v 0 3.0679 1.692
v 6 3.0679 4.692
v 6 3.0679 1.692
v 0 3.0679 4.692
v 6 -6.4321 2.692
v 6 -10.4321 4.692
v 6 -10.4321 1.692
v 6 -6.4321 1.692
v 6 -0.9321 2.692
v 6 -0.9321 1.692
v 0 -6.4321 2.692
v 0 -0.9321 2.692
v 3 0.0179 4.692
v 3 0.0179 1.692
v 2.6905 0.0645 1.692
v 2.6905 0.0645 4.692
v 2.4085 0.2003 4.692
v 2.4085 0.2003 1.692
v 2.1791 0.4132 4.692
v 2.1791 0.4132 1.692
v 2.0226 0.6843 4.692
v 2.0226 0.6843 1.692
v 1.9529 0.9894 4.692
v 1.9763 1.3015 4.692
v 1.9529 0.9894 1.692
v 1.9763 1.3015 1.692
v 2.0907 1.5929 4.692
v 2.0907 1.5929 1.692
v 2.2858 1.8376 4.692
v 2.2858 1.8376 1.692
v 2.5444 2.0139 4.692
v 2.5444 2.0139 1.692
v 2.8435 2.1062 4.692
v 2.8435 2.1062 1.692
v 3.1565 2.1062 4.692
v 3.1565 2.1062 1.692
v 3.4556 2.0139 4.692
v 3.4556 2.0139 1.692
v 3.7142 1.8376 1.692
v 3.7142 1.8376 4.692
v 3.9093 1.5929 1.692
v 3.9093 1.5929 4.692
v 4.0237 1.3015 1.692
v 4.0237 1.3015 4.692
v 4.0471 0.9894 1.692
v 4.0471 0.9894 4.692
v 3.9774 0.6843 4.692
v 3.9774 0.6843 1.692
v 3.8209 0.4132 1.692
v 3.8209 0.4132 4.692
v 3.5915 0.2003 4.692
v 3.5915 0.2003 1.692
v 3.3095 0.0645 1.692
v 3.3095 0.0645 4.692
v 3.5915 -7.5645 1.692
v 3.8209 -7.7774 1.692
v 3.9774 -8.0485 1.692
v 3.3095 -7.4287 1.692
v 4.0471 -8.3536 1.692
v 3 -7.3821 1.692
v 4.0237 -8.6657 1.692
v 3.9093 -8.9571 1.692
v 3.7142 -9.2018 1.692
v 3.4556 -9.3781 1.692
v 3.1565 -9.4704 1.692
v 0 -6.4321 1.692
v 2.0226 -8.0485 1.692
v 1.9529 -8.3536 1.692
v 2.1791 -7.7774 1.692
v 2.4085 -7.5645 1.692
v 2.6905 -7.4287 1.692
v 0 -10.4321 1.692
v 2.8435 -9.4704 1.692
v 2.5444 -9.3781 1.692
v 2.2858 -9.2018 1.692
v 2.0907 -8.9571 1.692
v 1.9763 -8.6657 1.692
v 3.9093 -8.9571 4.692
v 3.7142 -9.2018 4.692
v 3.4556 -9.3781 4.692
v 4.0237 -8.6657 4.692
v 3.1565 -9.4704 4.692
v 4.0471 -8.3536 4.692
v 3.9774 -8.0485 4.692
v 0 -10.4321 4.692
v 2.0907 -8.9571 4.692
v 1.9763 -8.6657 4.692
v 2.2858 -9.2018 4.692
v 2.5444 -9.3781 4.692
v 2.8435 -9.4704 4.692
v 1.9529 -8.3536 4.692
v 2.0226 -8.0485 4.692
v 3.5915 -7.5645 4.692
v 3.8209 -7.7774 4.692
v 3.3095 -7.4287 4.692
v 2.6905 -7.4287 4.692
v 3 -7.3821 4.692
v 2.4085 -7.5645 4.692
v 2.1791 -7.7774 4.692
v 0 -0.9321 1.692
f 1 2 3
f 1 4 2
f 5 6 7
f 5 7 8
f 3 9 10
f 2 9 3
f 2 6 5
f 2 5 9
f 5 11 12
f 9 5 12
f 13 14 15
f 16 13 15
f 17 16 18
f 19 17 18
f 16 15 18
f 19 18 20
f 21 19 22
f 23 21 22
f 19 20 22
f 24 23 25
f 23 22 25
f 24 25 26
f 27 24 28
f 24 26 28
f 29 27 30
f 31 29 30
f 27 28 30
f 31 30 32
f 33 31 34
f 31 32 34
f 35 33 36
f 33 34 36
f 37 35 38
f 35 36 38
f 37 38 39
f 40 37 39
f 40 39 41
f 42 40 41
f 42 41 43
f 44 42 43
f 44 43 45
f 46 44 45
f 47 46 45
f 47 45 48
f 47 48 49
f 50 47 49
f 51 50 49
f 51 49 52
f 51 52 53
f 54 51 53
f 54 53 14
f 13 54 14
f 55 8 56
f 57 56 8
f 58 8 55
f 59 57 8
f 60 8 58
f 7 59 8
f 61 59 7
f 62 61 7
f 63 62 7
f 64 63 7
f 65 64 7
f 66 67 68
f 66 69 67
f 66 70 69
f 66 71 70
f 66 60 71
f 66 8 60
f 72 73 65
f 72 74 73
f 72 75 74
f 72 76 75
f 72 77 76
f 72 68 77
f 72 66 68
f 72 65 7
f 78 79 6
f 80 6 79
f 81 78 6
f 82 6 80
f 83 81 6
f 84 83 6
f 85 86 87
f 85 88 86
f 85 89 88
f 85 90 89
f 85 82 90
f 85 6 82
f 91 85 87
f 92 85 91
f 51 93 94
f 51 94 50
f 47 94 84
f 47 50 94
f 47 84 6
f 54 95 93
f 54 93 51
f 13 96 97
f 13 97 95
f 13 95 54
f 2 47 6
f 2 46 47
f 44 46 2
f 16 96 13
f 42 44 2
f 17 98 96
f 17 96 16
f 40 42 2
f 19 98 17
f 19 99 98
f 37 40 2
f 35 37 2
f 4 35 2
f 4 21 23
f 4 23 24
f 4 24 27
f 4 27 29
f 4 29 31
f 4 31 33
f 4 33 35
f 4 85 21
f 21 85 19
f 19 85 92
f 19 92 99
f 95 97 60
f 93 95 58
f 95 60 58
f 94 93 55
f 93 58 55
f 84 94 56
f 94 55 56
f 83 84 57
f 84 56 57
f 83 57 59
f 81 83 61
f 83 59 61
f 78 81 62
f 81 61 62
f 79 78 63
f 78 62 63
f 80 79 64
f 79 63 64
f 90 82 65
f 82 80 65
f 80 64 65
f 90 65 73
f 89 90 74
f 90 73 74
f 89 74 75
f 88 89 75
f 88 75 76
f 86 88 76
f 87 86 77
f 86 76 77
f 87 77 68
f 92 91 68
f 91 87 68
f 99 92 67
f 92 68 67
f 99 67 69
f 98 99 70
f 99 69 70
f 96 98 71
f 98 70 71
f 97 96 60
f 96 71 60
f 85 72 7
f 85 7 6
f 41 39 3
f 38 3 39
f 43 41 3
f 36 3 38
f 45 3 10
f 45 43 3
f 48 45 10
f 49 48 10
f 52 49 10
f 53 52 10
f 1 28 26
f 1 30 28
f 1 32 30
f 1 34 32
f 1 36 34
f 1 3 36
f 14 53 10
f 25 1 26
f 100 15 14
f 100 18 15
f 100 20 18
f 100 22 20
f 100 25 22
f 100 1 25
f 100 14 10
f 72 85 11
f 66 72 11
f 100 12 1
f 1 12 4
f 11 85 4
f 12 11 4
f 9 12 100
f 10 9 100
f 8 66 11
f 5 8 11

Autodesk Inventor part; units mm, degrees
ref_plane "YZ Plane" through (0, 0, 0) normal (1, 0, 0) x (0, 1, 0)
ref_plane "XZ Plane" through (0, 0, 0) normal (0, 1, 0) x (-1, 0, 0)
ref_plane "XY Plane" through (0, 0, 0) normal (0, 0, 1) x (1, 0, 0)
sketch "Sketch1" plane through (0, 0, 0) normal (1, 0, 0) x (0, 1, 0)
  line L0 (-0.5, 0) -> (0.55, 0) projected
  line L1 (3.0679, 1.692) -> (-10.4321, 1.692)
  line L2 (-10.4321, 1.692) -> (-10.4321, 4.692)
  line L3 (-10.4321, 4.692) -> (3.0679, 4.692)
  line L4 (3.0679, 4.692) -> (3.0679, 1.692)
  line L5 (-0.9321, 1.692) -> (-6.4321, 1.692)
  line L6 (-6.4321, 1.692) -> (-6.4321, 2.692)
  line L7 (-6.4321, 2.692) -> (-0.9321, 2.692)
  line L8 (-0.9321, 2.692) -> (-0.9321, 1.692)
  line L9 (-3.6821, 1.692) -> (-3.6821, 4.692) construction
  line L10 (1.0679, 4.692) -> (1.0679, 1.692) construction
  line L11 (-0.5, 0) -> (0.55, 0) construction
  point P0 (0, 0)
  dimension "d0" = 5.5
  dimension "d1" = 4
  dimension "d2" = 2
  dimension "d3" = 1
  dimension "d4" = 2
extrude "Extrusion1" add sketch "Sketch1" along normal blind 6 contours L1 L8 L7 L6 L2 L3 L4
sketch "Sketch2" plane through (0, -10.4321, 4.692) normal (0, 0, 1) x (1, 0, 0)
  line L0 (0, 11.5) -> (6, 11.5) construction
  line L1 (6, 13.5) -> (6, 0) construction
  point P0 (0, 10.4321)
  point P1 (3, 11.5)
hole "Hole1" at (3, 1.0679, 4.692) direction (0, 0, -1) diameter 2.1 end through all clearance for "Socket Head Cap Screw ISO 4762" size "M2" standard "ISO"
ref_plane "Work Plane1" through (0, -3.6821, 4.692) normal (0, 1, 0) x (1, 0, 0)
mirror "Mirror1" about plane through (0, -3.6821, 4.692) normal (0, 1, 0) of "Hole1"
properties part number "Encoder_Cable_Clamp"
